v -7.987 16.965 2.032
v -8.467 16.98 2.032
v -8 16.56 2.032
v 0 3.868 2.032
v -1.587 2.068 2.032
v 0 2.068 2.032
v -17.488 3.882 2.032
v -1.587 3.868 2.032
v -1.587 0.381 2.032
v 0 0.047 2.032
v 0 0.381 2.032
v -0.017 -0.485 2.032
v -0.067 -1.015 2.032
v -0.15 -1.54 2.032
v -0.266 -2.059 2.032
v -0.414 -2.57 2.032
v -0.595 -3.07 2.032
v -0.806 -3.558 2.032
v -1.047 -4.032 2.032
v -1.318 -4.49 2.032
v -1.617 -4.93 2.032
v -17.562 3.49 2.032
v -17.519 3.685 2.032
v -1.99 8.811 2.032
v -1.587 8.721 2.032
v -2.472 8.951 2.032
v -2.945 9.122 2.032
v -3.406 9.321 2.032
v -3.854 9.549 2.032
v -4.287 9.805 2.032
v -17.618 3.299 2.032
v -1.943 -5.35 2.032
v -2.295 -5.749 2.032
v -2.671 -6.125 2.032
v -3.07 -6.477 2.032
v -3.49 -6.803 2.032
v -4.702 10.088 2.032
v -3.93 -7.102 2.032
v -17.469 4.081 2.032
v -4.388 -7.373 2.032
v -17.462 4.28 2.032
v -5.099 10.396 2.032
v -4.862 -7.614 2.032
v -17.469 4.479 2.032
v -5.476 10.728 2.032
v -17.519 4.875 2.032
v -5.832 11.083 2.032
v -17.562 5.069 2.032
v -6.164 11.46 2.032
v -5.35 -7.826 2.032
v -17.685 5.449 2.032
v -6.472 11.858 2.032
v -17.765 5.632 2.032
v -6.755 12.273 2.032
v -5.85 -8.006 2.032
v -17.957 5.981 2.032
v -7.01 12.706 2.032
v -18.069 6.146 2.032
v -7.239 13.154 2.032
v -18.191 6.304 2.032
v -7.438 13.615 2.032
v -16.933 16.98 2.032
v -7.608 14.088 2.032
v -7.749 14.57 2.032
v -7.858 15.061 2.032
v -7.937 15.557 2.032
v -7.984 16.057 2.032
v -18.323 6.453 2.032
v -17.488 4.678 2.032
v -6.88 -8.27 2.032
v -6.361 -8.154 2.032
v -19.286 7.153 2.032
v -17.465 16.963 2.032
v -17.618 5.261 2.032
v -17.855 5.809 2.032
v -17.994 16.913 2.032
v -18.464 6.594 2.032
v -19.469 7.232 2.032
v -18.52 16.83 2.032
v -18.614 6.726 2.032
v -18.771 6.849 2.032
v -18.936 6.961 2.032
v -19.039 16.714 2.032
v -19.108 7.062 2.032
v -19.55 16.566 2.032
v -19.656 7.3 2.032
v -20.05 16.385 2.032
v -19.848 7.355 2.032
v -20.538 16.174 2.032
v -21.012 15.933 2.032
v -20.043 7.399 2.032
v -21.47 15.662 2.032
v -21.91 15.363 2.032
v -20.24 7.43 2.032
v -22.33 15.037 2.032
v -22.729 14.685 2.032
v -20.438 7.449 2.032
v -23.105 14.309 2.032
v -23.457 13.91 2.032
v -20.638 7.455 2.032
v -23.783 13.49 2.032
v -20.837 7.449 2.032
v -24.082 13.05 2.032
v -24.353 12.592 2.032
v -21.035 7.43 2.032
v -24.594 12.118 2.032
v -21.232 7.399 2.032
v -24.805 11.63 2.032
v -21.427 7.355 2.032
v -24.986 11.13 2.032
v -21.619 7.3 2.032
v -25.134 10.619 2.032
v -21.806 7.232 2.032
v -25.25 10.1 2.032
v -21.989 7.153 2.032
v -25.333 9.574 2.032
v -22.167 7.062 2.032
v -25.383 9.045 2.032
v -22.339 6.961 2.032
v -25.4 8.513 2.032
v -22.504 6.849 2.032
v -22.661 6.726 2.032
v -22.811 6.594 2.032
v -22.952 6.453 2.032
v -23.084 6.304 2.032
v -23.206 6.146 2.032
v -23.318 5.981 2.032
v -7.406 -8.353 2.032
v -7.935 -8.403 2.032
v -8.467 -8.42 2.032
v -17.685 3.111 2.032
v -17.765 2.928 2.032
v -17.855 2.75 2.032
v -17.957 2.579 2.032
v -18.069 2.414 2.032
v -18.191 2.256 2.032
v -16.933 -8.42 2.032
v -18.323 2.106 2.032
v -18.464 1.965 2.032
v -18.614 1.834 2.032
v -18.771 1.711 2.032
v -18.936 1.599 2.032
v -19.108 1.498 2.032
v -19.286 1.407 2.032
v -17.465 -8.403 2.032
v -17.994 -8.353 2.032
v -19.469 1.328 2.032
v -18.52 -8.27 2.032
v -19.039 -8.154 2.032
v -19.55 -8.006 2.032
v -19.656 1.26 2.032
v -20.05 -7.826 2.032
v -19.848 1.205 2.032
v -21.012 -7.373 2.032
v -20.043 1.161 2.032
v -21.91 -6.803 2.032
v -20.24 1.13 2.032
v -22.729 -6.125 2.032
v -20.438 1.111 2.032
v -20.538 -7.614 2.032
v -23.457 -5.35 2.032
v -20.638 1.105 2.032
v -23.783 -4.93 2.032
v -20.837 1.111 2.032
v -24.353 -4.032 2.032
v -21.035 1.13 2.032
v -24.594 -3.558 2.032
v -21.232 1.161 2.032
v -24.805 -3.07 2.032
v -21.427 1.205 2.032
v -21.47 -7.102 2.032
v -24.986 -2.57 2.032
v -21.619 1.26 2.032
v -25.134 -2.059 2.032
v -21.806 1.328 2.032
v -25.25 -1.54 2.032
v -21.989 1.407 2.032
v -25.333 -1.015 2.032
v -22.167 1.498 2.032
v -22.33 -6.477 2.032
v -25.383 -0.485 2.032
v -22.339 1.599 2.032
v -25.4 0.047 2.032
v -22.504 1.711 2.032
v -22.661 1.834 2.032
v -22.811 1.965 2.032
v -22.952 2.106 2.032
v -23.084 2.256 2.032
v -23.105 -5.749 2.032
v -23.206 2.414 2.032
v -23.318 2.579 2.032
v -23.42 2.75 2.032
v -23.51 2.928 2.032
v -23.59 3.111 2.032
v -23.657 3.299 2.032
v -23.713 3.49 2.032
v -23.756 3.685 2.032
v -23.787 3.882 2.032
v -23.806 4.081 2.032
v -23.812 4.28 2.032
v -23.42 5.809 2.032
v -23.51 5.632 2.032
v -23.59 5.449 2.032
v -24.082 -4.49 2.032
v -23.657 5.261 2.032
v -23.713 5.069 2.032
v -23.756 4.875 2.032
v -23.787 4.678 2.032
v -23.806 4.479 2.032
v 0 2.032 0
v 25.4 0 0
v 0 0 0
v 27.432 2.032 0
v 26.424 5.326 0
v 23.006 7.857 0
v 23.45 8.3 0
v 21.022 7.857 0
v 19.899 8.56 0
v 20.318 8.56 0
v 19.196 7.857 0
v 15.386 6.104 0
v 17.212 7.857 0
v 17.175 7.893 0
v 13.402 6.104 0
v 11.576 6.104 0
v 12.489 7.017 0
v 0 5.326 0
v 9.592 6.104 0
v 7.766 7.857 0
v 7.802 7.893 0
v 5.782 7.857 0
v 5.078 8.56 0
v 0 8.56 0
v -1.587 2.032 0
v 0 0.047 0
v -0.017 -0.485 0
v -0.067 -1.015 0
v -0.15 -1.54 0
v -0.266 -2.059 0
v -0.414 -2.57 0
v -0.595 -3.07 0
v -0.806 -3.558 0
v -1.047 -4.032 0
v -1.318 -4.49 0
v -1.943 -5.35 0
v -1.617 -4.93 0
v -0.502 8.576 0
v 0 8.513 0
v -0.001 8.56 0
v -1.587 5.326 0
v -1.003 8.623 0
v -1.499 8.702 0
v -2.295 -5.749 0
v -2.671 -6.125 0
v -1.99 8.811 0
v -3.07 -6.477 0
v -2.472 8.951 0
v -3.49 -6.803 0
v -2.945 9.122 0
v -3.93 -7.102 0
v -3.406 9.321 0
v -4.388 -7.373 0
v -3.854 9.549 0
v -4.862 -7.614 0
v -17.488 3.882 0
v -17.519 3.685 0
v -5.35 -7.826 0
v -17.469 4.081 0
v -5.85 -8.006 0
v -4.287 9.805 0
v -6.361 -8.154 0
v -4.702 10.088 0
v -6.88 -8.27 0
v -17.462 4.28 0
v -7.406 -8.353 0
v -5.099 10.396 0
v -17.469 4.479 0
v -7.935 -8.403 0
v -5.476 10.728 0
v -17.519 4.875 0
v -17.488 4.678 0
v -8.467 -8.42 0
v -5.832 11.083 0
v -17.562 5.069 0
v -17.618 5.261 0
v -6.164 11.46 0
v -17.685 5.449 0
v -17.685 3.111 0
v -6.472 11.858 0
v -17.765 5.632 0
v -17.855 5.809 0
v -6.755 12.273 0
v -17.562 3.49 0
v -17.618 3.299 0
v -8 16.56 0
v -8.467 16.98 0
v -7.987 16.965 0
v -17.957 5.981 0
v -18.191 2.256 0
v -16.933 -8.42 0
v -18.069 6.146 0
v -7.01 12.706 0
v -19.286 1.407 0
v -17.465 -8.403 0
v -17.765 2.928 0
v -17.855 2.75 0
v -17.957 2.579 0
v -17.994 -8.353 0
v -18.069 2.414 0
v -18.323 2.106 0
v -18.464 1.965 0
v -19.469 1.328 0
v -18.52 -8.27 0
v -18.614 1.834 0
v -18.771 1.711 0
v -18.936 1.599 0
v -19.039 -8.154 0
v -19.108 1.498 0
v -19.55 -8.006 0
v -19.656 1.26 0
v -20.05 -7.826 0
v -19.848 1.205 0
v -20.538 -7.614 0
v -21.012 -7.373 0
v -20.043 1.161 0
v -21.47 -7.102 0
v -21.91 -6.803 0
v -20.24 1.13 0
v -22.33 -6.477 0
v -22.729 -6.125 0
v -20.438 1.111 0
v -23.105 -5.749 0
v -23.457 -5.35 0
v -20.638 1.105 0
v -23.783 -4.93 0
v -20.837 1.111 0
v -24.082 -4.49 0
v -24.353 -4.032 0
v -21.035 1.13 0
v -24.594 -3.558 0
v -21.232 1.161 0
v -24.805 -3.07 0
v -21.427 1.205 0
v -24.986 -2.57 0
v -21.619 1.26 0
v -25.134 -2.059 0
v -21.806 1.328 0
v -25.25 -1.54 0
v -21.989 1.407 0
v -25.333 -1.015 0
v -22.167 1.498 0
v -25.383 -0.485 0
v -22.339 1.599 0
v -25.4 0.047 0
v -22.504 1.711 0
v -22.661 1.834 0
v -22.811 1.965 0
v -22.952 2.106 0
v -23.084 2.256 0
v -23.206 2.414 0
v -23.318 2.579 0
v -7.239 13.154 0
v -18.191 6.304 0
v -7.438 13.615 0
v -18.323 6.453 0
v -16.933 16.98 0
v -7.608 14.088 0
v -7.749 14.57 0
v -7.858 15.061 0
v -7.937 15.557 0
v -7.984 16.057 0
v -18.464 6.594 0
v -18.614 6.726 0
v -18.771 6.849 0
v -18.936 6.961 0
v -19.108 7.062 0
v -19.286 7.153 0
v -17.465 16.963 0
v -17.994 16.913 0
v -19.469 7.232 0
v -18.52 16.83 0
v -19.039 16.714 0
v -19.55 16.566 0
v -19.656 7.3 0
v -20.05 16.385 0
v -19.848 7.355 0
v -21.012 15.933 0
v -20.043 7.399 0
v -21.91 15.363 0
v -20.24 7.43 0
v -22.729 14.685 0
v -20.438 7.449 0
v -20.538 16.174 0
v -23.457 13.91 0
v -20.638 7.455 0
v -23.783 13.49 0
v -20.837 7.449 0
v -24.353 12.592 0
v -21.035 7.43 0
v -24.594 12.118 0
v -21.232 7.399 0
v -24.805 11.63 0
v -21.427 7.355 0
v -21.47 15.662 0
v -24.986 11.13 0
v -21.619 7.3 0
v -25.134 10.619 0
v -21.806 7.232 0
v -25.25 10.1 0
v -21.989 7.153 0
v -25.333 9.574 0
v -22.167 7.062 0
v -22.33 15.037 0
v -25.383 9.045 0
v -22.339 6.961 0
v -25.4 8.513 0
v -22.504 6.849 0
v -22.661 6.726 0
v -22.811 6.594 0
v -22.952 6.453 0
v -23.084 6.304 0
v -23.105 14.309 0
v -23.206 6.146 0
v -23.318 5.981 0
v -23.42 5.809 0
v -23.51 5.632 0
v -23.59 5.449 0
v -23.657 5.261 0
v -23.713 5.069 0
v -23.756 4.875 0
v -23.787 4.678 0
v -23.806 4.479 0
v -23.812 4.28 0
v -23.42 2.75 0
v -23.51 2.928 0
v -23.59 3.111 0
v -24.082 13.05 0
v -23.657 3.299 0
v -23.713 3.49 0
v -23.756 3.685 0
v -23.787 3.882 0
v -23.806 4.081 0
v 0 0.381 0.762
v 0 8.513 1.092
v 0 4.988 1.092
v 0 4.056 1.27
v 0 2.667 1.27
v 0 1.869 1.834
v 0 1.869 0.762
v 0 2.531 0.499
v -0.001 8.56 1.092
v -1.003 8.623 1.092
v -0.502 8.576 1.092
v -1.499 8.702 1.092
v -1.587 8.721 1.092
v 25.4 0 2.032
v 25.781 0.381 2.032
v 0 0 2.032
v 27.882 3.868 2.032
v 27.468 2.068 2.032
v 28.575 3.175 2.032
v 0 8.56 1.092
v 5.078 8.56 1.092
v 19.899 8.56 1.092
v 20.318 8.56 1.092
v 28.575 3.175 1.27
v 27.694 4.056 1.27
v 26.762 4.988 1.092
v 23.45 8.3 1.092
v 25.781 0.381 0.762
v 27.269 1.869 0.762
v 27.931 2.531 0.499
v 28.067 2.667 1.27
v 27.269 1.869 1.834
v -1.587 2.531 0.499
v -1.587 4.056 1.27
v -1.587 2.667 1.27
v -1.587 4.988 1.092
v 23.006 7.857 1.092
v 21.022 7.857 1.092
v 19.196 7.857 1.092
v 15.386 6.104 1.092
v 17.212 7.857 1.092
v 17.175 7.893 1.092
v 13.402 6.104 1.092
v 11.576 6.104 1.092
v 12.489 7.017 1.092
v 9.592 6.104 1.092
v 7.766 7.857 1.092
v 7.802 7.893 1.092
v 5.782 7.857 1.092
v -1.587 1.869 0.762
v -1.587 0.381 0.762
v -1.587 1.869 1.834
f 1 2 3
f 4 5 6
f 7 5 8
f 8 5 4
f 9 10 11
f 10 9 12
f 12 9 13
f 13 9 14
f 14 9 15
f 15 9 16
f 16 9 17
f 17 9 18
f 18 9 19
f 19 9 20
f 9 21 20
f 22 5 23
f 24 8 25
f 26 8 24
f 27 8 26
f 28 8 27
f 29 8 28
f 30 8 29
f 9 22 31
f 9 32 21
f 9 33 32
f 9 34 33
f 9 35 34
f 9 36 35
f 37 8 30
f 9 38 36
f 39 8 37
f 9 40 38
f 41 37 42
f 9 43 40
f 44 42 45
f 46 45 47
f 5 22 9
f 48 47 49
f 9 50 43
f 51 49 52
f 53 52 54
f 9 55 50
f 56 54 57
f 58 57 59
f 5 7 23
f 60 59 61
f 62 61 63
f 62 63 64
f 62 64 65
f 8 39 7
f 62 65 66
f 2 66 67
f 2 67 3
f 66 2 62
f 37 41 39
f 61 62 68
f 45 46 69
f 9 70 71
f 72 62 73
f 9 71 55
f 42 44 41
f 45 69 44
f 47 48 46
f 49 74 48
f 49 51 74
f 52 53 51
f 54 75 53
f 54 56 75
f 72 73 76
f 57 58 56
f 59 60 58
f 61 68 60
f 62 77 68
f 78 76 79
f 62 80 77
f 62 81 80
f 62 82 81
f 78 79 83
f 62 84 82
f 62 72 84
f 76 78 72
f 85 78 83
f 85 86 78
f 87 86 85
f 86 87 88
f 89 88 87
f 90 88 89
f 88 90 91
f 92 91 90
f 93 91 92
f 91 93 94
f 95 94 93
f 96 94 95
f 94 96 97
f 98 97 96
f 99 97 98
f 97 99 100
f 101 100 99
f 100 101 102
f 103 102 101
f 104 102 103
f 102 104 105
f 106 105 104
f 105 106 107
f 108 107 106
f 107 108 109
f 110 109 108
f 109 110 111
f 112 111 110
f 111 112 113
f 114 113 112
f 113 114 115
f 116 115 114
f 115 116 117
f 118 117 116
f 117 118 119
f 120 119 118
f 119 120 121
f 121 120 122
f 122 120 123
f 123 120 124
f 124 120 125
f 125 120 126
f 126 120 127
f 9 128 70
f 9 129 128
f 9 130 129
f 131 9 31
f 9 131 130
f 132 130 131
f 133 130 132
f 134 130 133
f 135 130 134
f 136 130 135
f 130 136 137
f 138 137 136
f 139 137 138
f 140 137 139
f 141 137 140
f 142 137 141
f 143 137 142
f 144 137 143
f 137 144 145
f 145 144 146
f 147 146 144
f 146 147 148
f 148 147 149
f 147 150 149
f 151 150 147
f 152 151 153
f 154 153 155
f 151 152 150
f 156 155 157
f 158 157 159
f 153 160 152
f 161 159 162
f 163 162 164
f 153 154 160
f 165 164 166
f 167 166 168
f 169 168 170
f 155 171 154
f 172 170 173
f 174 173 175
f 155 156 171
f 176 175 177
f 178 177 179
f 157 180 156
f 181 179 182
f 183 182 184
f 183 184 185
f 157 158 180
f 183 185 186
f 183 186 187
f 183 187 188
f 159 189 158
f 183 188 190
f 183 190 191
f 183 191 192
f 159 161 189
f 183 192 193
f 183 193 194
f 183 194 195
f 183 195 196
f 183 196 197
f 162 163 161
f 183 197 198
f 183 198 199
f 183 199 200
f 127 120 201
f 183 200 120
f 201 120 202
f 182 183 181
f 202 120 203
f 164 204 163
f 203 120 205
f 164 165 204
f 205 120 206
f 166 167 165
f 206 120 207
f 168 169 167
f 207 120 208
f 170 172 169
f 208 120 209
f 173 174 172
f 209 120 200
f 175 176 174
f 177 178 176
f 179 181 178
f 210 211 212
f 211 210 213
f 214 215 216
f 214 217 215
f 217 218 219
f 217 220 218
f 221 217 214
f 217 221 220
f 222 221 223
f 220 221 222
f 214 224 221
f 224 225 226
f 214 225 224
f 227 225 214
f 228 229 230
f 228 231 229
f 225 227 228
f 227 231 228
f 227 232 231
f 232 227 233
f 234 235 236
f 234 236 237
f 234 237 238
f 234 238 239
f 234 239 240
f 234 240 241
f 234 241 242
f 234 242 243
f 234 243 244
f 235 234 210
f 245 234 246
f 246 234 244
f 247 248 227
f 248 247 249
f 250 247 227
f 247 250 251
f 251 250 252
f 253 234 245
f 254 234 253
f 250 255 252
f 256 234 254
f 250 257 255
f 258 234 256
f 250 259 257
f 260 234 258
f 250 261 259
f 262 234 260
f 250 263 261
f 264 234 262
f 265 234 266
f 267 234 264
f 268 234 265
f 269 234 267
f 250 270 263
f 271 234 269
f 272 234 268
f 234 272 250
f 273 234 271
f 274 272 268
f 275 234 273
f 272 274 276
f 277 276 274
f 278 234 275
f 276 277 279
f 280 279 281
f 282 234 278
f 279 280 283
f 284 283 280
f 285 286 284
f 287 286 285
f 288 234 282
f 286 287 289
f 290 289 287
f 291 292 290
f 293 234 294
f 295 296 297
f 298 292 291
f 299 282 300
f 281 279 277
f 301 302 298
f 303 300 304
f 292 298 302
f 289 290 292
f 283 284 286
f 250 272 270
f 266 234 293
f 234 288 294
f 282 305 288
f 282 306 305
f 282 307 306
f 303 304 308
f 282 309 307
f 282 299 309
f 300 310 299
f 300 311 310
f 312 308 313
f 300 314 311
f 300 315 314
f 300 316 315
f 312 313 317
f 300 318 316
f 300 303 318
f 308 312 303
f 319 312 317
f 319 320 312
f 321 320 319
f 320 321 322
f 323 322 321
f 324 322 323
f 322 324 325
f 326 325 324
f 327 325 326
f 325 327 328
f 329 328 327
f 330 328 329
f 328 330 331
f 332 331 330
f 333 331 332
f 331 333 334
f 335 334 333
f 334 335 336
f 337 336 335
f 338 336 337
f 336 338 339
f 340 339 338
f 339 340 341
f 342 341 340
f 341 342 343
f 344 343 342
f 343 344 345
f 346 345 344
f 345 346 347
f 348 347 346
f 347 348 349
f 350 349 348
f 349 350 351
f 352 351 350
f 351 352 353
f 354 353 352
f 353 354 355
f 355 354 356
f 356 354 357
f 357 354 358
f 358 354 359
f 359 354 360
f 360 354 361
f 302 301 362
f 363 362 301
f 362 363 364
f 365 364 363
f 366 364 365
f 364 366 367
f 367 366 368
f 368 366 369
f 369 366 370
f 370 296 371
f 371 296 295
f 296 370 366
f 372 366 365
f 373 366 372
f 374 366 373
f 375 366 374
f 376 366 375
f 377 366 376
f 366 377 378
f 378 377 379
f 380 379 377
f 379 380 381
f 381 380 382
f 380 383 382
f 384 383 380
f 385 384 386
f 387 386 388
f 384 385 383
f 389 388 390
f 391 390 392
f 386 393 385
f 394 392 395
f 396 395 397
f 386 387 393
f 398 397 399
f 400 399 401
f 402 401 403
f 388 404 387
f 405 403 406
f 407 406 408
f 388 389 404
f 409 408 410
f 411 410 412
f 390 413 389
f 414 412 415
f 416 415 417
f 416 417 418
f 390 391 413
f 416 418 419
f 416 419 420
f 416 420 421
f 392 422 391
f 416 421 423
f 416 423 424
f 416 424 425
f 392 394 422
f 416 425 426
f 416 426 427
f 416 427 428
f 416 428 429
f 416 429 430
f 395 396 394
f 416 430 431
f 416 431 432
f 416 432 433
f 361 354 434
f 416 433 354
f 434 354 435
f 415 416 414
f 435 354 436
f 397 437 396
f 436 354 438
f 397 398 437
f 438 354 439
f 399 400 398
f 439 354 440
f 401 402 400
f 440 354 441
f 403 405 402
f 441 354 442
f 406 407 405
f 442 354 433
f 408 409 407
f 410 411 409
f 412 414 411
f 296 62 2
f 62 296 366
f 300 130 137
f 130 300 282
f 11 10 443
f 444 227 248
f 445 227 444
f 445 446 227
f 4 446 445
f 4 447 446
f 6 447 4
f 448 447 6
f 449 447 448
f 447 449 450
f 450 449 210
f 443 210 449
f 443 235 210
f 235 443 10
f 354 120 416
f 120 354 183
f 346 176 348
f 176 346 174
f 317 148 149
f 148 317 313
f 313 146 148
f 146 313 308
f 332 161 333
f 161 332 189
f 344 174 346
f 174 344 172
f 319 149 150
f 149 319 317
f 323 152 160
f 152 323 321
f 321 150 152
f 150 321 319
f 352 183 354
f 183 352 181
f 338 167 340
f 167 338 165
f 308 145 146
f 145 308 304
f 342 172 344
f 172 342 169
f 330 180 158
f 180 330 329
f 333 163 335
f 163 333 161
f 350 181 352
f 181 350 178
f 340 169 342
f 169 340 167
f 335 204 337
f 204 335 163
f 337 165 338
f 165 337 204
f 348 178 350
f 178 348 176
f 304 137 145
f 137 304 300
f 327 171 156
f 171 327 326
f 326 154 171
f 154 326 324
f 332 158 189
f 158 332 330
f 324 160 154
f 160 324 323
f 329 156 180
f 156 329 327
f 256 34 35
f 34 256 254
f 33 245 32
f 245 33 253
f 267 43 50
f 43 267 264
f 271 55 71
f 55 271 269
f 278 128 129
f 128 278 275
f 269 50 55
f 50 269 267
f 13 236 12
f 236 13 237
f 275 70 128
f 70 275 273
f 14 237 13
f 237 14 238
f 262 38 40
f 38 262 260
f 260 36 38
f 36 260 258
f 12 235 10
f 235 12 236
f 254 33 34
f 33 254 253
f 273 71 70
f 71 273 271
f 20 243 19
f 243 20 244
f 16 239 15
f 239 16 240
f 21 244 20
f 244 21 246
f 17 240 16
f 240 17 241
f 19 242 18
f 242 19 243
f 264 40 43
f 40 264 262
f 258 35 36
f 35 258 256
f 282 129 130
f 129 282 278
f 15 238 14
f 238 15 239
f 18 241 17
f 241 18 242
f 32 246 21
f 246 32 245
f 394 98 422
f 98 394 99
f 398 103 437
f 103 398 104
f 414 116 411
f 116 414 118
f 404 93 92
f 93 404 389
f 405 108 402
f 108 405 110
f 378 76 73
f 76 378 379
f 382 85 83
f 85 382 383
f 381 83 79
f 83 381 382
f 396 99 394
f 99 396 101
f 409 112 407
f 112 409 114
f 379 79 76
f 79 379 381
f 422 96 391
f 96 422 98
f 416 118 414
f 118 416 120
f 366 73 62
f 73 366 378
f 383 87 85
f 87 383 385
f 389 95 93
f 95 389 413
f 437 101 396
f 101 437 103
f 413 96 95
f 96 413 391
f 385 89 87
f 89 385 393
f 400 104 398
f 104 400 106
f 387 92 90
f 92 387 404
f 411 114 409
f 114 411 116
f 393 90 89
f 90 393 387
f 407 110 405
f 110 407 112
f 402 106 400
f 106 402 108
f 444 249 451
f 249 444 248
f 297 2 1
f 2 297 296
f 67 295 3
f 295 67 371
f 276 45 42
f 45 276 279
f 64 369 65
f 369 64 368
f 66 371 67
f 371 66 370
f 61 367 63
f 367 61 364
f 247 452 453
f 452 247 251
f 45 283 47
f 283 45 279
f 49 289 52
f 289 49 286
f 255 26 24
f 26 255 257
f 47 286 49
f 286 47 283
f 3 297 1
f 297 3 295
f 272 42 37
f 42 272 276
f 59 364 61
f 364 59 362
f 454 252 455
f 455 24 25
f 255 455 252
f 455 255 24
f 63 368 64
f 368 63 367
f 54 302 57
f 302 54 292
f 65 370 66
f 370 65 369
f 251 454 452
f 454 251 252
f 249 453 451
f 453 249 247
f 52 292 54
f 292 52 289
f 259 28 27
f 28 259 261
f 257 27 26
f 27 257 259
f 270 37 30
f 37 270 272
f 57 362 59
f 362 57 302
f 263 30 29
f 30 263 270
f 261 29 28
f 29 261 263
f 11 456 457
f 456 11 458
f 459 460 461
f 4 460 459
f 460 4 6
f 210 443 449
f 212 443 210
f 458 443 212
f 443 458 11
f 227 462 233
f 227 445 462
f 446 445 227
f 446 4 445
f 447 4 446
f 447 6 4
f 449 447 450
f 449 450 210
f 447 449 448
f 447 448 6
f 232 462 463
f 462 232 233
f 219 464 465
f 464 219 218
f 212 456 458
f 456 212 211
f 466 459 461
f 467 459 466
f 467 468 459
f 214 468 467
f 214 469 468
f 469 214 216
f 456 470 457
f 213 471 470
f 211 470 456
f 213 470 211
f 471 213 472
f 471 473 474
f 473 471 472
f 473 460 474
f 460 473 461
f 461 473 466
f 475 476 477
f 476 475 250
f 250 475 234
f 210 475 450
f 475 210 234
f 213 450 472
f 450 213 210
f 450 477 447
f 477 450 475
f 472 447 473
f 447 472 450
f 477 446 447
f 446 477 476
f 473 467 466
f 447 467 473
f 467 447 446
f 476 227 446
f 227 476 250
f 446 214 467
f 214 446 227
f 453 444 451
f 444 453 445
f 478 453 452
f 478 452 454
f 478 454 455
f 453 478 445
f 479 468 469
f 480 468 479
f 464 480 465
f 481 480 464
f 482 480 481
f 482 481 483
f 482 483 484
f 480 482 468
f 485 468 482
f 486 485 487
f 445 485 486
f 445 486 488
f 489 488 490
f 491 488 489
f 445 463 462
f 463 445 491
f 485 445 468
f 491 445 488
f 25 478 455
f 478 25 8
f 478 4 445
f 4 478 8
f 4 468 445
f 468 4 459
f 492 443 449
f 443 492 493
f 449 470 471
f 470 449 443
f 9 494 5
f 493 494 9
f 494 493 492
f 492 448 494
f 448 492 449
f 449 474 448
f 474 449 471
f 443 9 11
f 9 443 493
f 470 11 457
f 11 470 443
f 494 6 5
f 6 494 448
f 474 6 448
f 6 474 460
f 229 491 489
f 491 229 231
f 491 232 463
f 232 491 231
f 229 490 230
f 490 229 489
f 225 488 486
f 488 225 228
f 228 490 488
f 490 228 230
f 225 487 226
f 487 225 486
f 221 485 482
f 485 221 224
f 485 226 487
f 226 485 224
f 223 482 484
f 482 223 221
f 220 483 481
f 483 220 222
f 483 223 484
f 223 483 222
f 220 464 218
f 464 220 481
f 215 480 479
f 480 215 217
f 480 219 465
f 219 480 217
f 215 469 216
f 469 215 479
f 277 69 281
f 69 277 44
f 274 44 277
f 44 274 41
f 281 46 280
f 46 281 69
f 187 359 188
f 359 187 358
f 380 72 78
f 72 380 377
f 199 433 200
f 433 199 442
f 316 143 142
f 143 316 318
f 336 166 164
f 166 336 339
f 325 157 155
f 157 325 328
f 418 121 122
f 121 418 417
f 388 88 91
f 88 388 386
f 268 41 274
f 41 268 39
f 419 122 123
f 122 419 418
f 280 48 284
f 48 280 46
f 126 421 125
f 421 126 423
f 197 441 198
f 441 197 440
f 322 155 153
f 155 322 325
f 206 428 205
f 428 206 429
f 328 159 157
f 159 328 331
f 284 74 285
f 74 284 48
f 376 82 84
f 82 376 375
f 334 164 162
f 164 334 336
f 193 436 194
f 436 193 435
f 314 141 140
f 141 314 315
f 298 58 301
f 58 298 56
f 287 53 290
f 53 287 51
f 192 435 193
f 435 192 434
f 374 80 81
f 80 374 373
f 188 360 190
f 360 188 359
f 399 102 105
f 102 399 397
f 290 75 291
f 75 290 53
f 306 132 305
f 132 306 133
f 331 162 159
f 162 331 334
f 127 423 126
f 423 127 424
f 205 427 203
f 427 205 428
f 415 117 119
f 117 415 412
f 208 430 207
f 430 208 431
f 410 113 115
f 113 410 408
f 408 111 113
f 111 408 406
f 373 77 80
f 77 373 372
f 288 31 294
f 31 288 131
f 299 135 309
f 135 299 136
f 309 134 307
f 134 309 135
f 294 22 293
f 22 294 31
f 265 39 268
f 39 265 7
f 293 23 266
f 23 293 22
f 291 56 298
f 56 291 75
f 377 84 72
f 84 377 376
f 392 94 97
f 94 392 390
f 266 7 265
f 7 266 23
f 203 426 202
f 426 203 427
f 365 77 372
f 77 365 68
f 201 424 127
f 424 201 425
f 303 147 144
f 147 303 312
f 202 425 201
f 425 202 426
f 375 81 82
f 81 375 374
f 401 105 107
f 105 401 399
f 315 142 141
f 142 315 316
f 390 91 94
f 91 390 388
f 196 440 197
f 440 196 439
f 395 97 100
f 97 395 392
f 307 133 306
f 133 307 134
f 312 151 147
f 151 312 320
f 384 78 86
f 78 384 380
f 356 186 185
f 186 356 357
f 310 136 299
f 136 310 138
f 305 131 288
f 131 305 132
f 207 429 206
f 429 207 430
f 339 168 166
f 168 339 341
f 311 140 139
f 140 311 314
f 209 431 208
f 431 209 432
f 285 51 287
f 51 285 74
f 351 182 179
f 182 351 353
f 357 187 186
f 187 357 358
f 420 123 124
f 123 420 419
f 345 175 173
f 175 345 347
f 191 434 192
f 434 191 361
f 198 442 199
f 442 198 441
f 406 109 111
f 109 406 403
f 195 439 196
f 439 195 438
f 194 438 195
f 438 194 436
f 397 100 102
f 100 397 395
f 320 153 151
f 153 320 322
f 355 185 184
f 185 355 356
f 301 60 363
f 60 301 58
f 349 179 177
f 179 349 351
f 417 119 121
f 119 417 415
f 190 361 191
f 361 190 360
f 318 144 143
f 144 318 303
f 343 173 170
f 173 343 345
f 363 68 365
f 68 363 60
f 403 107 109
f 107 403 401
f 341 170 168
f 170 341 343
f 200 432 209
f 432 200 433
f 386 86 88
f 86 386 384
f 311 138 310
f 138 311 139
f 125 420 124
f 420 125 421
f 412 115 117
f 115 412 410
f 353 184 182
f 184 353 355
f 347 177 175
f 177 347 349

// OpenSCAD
// Physical Keygen - by Nirav Patel <http://eclecti.cc>
//
// Generate a duplicate of a Kwikset KW1 key by editing the last line of the file
// and entering in the key code of the lock.  If you don't know the key code,
// you can measure the key and compare the numbers at:
// http://web.archive.org/web/20050217020917fw_/http://dlaco.com/spacing/tips.htm
//
// This work is licensed under a Creative Commons Attribution 3.0 Unported License.

// Since the keys and locks I have were all designed in imperial units, the
// constants in this file will be defined in inches.  The mm function
// allows us to retain the proper size for exporting a metric STL.
function mm(i) = i*25.4;
$fn=100;

module rounded(size, r) {
    union() {
        translate([r, 0, 0]) cube([size[0]-2*r, size[1], size[2]]);
        translate([0, r, 0]) cube([size[0], size[1]-2*r, size[2]]);
        translate([r, r, 0]) cylinder(h=size[2], r=r);
        translate([size[0]-r, r, 0]) cylinder(h=size[2], r=r);
        translate([r, size[1]-r, 0]) cylinder(h=size[2], r=(r));
        translate([size[0]-r, size[1]-r, 0]) cylinder(h=size[2], r=r);
	  }
}

module bit() {
    w = mm(1/4);
    difference() {
        translate([-w/2, 0, 0]) cube([w, mm(1), w]);
        translate([-mm(5/128), 0, 0]) rotate([0, 0, 135]) cube([w, w, w]);
        translate([mm(5/128), 0, 0]) rotate([0, 0, -45]) cube([w, w, w]);
    }
}

// Kwikset KW1 5 pin key.  The measurements are mostly guesses based on reverse
// engineering some keys I have and some publicly available information.
module kw1(bits) {
    // You may need to adjust these to fit your specific printer settings
     thickness = mm(0.080);
    length = mm(9/8);
    width = mm(.337);
    
    shoulder = mm(.247);
    pin_spacing = mm(.15);
    depth_inc = mm(.023);
    
    // A fudge factor.  Printing with your average RepRap, the bottom layer is
    // going to be squeezed larger than you want. You can make the pins
    // go slighly deeper by a fudge amount to make up for it if you aren't
    // adjusting for it elsewhere like Skeinforge or in your firmware.
    fudge = 0.5;
    
    // Handle size
    h_l = mm(1);
    h_w = mm(1);
    h_d = mm(1/16);
    difference() {
        // blade and key handle
        union() {
            translate([-h_l, -h_w/2 + width/2, 0])  difference() {
                rounded([h_l, h_w, thickness], mm(1/3));
                // Round out edge of bow to blade            
                translate([h_l, h_w/2 + width/2 + 8, 0]) cylinder(h=thickness, r=8);
		       }

            // cut a little off the tip to avoid going too long
            cube([length, width, thickness]);
        }
        
        // chamfer the tip
        translate([length, mm(1/8), 0]) {
            rotate([0, 0, 45]) cube([10, 10, thickness]);
            rotate([0, 0, 225]) cube([10, 10, thickness]);
        }
        
        // put in a hole for keychain use
        translate([-h_l + mm(3/16), width/2, 0]) cylinder(h=thickness, r=mm(1/8));
        
        // cut the channels in the key.  designed more for printability than accuracy
        union() {
            translate([-h_d, mm(.105), mm(.025)]) rotate([225, 0, 0]) cube([length + h_d, width, width]);
            translate([-h_d, mm(.105), mm(.05)]) rotate([260, 0, 0]) cube([length + h_d, thickness/2, mm(1/32)]);
            translate([-h_d, mm(.105), 0]) cube([length + h_d, mm(7/128), mm(.05)]);
            translate([-h_d, mm(.105) + mm(7/128), mm(.05)]) rotate([225, 0, 0]) cube([length + h_d, mm(3/64), thickness]);
        }
        
        translate([-h_d, width - mm(9/64), mm(.043)]) {
            cube([length + h_d, width - (width - mm(10/64)), thickness]);
            rotate([50, 0, 0]) cube([length + h_d, width, thickness]);
        }
        
        union() {
            translate([-h_d, mm(0.015), mm(.03)]) cube([length + h_d, mm(15/256), thickness]);
            translate([-h_d, mm(0.015) + mm(13/256), thickness - mm(1/64)]) rotate([45, 0, 0]) cube([length + h_d, mm(1/16), mm(1/16)]);
        }
        
        // Do the actual bitting
        for (b = [0:4]) {
            // KW1 doesn't have a 0 value and instead has 1 start around .008" deep
            translate([shoulder + fudge + b*pin_spacing, width - mm(.008) - (bits[b] - 1)*depth_inc - fudge, 0]) bit();
        }
    }
}

// This sample key goes to a lock that is sitting disassembled on my desk
// Flip the key over for easy printing
kw1([1,4,4,1,1]);
